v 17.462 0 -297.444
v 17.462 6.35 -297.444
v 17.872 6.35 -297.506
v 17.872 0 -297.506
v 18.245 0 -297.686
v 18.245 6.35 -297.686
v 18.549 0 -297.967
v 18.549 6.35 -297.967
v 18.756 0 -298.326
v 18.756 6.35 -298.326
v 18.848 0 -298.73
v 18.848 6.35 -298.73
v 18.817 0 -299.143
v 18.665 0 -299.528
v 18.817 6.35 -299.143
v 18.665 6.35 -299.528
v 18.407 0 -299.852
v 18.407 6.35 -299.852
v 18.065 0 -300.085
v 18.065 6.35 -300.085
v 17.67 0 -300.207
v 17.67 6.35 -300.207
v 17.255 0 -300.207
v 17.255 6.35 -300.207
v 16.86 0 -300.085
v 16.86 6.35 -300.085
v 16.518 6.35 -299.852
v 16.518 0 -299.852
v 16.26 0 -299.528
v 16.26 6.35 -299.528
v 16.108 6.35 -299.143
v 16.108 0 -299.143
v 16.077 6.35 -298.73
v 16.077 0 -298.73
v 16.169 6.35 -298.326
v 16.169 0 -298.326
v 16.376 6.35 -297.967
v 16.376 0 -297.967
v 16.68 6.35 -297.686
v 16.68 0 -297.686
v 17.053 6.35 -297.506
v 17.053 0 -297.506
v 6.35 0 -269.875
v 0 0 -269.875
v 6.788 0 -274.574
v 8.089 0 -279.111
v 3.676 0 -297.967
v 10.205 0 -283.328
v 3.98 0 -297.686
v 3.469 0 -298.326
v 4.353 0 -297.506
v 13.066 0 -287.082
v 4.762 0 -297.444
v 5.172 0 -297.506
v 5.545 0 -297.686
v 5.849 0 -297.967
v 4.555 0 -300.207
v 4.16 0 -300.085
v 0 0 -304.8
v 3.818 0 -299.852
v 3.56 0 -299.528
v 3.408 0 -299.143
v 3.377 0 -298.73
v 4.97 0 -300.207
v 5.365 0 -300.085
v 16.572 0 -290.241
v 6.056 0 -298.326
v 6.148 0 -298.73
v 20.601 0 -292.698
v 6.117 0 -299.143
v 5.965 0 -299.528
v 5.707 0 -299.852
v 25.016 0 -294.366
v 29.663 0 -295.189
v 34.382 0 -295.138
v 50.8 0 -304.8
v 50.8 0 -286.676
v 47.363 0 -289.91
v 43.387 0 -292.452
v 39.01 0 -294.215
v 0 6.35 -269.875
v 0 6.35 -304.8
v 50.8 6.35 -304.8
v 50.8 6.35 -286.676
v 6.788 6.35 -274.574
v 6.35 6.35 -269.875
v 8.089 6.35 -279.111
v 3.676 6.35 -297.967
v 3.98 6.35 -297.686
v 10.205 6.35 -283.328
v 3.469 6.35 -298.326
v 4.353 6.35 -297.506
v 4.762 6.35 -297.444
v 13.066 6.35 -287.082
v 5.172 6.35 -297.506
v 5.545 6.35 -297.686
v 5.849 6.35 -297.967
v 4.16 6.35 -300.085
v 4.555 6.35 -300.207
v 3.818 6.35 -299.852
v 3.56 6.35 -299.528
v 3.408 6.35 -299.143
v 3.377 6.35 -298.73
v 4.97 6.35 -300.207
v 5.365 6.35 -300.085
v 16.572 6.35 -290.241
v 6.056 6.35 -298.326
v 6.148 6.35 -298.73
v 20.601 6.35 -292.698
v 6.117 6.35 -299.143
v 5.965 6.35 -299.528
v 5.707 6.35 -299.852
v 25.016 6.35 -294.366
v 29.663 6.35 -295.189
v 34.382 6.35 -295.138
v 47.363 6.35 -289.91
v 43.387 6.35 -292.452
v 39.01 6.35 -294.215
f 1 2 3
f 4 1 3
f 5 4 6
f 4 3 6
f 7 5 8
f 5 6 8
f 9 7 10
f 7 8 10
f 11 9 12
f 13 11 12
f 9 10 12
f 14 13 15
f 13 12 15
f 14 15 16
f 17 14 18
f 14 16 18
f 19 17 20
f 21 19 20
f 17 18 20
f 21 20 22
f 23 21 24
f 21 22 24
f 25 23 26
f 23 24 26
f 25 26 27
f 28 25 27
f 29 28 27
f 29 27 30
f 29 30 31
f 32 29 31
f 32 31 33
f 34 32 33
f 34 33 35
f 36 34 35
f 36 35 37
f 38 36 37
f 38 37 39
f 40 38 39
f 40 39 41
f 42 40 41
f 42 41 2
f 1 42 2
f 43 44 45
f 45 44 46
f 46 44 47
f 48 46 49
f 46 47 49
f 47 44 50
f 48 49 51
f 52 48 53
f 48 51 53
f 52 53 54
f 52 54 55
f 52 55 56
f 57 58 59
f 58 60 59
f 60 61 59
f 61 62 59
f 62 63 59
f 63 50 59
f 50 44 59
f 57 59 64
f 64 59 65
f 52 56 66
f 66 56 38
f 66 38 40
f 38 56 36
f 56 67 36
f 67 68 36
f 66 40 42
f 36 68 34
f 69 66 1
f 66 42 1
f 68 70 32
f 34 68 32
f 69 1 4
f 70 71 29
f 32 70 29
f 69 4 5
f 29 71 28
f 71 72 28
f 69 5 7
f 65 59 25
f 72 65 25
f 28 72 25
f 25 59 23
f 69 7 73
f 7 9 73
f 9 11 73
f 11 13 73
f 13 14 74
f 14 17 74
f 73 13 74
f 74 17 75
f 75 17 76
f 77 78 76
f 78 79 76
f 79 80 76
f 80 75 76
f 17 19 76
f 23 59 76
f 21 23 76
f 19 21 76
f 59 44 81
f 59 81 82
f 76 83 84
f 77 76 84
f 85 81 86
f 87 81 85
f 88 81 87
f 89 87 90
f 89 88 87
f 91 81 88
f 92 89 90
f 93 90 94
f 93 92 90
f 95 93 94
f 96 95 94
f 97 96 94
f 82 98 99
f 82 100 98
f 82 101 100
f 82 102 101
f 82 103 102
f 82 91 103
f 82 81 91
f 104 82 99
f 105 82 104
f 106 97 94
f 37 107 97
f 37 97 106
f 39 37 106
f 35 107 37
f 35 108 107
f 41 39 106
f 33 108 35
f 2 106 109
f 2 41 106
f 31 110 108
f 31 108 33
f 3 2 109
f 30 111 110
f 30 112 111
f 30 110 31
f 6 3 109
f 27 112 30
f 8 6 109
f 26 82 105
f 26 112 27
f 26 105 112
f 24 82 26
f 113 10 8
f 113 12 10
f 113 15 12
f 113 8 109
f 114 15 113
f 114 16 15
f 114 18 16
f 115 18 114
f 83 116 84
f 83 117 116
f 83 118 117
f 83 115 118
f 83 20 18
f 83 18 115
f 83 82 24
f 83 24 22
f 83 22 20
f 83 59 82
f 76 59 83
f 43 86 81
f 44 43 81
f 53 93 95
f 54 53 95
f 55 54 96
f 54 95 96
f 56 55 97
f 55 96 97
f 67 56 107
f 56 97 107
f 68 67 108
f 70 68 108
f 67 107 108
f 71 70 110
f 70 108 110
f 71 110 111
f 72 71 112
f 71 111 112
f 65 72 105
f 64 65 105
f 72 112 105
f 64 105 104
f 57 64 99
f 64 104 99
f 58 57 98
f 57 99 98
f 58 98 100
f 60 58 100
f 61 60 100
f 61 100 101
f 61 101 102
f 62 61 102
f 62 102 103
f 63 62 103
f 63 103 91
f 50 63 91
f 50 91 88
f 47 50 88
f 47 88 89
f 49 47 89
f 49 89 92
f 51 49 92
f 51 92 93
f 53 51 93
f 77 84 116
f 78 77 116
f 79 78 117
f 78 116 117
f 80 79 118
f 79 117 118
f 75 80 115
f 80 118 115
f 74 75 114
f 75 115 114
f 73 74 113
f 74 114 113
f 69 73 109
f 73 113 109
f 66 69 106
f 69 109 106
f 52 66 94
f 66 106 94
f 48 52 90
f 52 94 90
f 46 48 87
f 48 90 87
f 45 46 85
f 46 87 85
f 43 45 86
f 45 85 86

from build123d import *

# Parameters (mm, degrees)
SKETCH1_W           = 304.8
SKETCH1_H           = 304.8
BOSS_EXTRUDE1_DEPTH = 6.35
CUT_EXTRUDE1_DEPTH  = 432.099063441
SKETCH3_R           = 25.4
CUT_EXTRUDE2_DEPTH  = 310.0695755
SKETCH4_R           = 1.3890625
CUT_EXTRUDE3_DEPTH  = 310.0695755


with BuildPart() as part:
    # Sketch1 → Boss-Extrude1 (new body)
    with BuildSketch(Plane(origin=(0, 0, 0), x_dir=(1, 0, 0), z_dir=(0, 1, 0))):
        with Locations((152.4, 152.4)):
            Rectangle(SKETCH1_W, SKETCH1_H)
    extrude(amount=BOSS_EXTRUDE1_DEPTH)

    # Sketch2 → Cut-Extrude1 (cut, through all)
    with BuildSketch(Plane(origin=(0, 6.35, 0), x_dir=(1, 0, 0), z_dir=(0, 1, 0))):
        Polygon((50.8, 304.8), (50.8, 269.875), (0, 269.875), (0, 0), (304.8, 0), (304.8, 304.8), align=None)
    extrude(amount=-CUT_EXTRUDE1_DEPTH, mode=Mode.SUBTRACT)

    # Sketch3 → Cut-Extrude2 (cut, through all)
    with BuildSketch(Plane(origin=(0, 6.35, 0), x_dir=(1, 0, 0), z_dir=(0, 1, 0))):
        with Locations((31.75, 269.875)):
            Circle(SKETCH3_R)
    extrude(amount=-CUT_EXTRUDE2_DEPTH, mode=Mode.SUBTRACT)

    # Sketch4 → Cut-Extrude3 (cut, through all)
    with BuildSketch(Plane(origin=(0, 6.35, 0), x_dir=(1, 0, 0), z_dir=(0, 1, 0))):
        with Locations(Location((4.7625, 298.833465882, 0), (0, 0, 270))):
            Circle(SKETCH4_R)
        with Locations(Location((17.4625, 298.833465882, 0), (0, 0, 270))):
            Circle(SKETCH4_R)
    extrude(amount=-CUT_EXTRUDE3_DEPTH, mode=Mode.SUBTRACT)


solid = part.part
